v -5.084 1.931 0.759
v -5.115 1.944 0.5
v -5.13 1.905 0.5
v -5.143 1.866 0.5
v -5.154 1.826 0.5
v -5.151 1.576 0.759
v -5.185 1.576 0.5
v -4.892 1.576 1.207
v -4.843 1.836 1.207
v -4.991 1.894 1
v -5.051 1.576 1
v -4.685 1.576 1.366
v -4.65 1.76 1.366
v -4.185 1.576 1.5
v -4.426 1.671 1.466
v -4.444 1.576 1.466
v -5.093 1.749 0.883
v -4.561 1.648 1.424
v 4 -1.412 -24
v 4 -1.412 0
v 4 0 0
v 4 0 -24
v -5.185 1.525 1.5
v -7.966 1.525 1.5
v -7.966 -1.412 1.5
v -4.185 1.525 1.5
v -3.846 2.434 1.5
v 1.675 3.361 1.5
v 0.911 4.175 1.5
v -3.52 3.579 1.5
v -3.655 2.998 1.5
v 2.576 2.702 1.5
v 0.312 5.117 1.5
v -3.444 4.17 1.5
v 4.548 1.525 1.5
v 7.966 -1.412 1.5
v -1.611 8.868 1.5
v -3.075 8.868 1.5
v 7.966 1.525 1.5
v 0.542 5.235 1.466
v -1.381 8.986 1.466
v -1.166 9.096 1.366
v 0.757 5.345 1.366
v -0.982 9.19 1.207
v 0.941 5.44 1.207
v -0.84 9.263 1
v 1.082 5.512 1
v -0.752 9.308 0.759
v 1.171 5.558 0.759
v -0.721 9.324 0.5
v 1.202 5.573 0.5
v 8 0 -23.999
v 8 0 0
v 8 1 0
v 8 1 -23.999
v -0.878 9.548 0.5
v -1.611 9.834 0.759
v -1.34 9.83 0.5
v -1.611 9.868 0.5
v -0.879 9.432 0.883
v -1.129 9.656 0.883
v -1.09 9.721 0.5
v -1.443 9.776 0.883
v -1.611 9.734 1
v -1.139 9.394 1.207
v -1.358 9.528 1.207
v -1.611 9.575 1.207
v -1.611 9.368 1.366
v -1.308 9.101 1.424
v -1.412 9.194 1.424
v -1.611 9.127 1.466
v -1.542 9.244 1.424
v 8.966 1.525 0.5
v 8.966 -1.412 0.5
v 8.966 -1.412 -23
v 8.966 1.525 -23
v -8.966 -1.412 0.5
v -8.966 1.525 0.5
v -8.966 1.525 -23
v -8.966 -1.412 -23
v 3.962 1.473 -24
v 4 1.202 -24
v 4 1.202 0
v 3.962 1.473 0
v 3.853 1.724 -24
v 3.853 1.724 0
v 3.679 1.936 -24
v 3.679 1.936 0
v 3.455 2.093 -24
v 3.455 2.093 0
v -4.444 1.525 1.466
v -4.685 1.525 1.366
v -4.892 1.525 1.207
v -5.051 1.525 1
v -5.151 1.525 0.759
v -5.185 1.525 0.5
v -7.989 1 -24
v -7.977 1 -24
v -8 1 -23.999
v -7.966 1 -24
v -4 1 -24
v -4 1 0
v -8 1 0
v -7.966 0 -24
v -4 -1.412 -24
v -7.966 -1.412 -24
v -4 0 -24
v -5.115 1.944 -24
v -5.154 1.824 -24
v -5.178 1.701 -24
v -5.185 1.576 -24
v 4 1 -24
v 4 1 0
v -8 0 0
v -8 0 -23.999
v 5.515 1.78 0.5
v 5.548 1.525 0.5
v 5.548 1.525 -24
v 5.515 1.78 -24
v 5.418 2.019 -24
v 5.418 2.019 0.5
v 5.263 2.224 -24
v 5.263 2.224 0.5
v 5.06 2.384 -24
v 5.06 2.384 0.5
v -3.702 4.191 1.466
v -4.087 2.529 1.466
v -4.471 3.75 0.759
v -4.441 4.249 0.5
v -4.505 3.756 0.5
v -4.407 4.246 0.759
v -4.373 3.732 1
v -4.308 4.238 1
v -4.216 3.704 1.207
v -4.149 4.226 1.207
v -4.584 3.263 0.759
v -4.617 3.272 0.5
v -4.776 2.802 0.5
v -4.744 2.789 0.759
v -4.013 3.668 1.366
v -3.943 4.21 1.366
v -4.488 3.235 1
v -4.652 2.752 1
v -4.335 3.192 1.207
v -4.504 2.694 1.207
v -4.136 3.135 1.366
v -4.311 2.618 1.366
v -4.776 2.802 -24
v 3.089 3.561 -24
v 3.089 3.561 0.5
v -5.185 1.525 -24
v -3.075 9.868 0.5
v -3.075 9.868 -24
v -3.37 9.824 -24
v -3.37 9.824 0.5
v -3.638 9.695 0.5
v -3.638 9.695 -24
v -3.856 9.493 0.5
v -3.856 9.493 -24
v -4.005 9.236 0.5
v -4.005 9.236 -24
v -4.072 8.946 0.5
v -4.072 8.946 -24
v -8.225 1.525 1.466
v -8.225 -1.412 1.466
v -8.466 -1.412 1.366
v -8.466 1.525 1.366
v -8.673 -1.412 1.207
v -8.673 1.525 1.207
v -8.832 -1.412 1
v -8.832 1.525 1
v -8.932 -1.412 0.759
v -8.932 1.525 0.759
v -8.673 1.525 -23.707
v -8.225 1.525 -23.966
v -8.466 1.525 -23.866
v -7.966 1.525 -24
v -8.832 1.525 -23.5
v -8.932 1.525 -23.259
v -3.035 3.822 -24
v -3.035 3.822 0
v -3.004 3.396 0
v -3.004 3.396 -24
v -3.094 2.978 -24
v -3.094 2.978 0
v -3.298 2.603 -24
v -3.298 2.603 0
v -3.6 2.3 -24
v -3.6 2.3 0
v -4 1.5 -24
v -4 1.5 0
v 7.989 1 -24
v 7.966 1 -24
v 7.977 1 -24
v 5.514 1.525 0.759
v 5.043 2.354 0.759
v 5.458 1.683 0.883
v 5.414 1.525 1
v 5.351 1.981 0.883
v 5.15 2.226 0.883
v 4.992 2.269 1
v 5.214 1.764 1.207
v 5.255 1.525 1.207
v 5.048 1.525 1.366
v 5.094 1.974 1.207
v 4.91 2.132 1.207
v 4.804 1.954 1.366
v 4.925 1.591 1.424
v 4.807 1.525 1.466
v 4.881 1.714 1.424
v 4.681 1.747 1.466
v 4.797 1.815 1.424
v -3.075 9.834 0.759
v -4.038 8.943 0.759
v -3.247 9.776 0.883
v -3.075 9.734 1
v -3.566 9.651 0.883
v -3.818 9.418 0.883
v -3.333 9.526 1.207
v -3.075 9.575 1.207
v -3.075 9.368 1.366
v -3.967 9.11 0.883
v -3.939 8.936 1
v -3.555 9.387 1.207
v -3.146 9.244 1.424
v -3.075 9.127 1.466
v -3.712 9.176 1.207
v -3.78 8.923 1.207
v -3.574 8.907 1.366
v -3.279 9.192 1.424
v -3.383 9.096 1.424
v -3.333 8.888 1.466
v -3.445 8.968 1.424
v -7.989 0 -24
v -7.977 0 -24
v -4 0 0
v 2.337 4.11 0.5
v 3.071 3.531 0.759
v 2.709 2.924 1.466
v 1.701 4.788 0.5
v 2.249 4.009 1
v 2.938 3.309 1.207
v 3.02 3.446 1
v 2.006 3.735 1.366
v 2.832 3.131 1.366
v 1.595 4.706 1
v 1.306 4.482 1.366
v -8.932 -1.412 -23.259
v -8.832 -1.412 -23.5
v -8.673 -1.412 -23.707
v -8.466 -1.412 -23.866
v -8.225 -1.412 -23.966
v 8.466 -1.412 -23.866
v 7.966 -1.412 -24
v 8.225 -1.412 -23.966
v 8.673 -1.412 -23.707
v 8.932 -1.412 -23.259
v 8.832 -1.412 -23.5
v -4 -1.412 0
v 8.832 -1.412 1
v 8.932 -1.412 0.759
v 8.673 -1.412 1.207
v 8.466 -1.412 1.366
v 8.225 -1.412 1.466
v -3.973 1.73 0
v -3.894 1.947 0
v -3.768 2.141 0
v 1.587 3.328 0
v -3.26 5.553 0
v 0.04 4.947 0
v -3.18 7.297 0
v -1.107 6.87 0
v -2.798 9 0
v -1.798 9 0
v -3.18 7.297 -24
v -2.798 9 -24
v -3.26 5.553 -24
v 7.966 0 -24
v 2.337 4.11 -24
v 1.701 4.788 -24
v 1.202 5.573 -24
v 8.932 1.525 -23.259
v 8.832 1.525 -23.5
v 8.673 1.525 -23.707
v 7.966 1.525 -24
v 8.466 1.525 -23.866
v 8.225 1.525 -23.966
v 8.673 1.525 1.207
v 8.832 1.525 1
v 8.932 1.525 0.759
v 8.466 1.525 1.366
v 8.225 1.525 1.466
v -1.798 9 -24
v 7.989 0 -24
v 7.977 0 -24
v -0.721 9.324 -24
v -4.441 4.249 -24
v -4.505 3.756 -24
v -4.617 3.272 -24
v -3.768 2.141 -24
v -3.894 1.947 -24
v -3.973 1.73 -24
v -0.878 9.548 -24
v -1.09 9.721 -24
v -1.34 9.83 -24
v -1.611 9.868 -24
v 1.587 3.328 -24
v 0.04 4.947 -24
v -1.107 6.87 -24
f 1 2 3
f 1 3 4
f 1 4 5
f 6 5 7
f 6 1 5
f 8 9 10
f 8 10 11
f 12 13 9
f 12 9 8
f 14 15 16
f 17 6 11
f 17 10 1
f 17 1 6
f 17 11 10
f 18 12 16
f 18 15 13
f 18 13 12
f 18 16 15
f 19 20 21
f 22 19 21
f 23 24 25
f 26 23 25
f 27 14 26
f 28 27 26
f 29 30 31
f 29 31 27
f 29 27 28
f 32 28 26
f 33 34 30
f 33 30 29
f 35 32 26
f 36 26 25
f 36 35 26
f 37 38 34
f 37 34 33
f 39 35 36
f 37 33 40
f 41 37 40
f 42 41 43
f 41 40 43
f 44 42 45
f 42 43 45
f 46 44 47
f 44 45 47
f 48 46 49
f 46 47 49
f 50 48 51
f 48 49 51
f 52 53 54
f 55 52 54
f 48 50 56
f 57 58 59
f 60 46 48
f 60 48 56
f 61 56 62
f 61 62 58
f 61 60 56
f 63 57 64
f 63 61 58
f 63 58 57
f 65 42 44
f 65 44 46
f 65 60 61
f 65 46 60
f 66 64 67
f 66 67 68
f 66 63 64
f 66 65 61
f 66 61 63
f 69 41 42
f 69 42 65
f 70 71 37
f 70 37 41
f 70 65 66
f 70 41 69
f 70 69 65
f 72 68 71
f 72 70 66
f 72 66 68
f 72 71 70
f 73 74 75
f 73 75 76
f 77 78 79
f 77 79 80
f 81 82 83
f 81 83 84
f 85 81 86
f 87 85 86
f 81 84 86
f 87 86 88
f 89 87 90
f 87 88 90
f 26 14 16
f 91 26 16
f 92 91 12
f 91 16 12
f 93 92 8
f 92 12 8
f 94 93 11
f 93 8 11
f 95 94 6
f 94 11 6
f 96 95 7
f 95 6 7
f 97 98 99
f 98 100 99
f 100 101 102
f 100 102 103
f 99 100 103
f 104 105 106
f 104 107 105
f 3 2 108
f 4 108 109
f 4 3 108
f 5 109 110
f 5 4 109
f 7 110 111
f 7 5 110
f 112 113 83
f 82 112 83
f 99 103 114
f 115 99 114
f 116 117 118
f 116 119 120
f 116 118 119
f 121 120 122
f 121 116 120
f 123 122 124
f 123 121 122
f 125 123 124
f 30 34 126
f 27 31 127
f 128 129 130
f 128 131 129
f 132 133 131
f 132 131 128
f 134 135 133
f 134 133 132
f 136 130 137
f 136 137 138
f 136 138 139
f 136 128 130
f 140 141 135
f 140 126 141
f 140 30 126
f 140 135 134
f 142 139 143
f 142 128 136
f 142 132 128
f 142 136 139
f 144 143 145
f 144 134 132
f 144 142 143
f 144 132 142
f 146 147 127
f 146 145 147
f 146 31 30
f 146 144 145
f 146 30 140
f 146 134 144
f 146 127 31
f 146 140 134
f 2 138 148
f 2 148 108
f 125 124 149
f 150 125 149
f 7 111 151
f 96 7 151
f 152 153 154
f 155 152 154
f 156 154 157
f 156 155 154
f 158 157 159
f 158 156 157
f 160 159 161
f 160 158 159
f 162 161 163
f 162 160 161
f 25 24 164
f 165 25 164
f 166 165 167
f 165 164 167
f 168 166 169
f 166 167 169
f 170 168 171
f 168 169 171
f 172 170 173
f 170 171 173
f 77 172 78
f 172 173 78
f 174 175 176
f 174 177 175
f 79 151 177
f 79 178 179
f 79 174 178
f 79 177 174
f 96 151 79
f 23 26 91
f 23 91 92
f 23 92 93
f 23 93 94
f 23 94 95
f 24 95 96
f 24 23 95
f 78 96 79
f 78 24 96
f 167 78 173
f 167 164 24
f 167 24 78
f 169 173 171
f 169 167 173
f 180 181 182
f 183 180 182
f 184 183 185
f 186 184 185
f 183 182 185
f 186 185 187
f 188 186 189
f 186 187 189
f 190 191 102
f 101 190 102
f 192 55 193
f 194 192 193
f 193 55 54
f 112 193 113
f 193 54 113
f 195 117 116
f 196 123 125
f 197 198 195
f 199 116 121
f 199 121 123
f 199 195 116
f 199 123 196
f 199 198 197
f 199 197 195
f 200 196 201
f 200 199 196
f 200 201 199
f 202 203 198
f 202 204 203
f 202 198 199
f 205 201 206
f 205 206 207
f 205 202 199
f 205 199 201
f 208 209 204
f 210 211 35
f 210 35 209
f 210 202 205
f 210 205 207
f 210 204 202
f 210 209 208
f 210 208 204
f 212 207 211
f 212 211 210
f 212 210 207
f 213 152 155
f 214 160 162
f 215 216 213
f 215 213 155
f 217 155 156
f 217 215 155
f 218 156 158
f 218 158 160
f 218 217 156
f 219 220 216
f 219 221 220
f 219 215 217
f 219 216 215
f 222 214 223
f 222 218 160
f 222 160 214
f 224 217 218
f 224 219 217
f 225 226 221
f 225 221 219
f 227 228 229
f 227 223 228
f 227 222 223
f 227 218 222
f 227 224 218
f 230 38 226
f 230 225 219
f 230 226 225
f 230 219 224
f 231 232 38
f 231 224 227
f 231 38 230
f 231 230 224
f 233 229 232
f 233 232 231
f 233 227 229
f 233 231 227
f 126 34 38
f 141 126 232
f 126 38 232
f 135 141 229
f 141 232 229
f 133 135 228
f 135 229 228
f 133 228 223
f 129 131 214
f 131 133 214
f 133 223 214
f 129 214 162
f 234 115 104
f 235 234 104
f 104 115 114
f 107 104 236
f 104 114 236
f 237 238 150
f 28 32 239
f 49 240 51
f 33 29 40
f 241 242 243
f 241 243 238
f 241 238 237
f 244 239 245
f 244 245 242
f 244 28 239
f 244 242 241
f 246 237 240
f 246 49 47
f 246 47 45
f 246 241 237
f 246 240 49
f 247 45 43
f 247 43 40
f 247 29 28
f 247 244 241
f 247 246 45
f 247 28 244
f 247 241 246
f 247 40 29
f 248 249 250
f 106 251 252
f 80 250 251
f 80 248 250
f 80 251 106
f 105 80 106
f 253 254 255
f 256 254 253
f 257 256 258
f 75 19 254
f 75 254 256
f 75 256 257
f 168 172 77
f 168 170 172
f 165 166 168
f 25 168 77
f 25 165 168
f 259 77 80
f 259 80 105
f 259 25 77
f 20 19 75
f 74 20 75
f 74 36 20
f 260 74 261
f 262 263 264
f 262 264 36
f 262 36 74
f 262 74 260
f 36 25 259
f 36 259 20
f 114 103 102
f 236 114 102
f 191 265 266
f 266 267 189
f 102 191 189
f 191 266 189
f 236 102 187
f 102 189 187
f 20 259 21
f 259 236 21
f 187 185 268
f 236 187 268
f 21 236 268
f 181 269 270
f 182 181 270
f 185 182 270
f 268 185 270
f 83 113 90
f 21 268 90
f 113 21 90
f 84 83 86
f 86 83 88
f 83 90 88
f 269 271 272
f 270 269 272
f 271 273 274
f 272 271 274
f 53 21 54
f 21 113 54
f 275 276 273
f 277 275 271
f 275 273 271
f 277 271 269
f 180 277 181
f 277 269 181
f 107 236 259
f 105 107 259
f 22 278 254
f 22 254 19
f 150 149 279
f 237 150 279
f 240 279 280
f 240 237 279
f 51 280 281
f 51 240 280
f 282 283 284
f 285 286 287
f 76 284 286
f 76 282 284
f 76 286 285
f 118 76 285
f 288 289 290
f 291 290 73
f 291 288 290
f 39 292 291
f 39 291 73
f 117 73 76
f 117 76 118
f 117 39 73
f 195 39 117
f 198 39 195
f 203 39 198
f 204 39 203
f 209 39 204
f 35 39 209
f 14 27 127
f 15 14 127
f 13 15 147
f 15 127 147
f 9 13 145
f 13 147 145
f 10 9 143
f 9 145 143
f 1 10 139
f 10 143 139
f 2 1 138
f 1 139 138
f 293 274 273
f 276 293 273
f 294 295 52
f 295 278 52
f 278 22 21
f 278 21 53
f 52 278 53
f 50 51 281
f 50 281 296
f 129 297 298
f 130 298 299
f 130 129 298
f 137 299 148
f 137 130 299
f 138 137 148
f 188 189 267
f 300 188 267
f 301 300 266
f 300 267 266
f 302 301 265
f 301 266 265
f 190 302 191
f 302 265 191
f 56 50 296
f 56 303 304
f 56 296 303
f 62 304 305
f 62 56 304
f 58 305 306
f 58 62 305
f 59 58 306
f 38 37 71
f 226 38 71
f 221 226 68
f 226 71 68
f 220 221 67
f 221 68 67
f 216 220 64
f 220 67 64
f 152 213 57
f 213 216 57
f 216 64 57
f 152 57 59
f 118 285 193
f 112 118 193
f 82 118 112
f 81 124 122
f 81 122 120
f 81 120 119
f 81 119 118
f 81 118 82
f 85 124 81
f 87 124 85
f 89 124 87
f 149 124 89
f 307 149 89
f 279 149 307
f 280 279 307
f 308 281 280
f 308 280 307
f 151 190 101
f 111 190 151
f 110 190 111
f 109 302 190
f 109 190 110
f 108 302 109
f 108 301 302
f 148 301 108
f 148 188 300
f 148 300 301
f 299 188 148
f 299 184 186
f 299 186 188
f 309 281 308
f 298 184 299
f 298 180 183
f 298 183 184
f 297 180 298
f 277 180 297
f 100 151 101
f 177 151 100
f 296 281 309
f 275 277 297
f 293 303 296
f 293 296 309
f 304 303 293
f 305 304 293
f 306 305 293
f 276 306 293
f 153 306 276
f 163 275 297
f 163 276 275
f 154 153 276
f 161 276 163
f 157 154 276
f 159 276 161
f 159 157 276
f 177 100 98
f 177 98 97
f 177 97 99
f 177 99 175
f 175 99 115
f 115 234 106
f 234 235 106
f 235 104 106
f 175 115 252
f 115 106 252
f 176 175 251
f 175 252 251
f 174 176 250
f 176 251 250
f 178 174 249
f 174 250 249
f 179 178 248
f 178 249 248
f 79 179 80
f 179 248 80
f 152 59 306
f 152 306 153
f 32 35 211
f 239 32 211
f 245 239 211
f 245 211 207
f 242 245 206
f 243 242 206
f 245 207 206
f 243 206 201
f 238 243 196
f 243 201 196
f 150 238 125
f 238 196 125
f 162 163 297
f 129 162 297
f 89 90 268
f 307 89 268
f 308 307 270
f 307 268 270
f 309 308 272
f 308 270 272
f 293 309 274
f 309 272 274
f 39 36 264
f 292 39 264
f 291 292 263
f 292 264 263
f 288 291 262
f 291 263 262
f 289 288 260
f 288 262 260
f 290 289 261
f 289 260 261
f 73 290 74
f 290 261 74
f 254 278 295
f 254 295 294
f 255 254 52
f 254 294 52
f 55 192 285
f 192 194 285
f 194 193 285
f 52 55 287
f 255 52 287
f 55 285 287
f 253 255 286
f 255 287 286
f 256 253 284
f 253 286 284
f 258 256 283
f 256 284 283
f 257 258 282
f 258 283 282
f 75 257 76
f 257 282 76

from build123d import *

# Parameters (mm, degrees)
EXTRUSION1_DEPTH = 24
EXTRUSION2_START = 1.5
EXTRUSION2_DEPTH = 1.5
CONG_1_R         = 1


with BuildPart() as part:
    # Esquisse1 → Extrusion1 (new body)
    with BuildSketch(Plane.XY):
        with BuildLine():
            Line((-5.185390739, 1.525025478), (-5.185390739, 1.576014862))
            ThreePointArc((-5.185390739, 1.576014862), (-5.167721774, 1.763166505), (-5.115339265, 1.943704595))
            Line((-5.115339265, 1.943704595), (-4.776128633, 2.801624733))
            ThreePointArc((-4.776128633, 2.801624733), (-4.554638642, 3.512645897), (-4.441213812, 4.248678315))
            Line((-4.441213812, 4.248678315), (-4.072373491, 8.946086961))
            ThreePointArc((-4.072373491, 8.946086961), (-3.754309066, 9.602069144), (-3.075442001, 9.867807945))
            Line((-3.075442001, 9.867807945), (-1.611111903, 9.867807945))
            ThreePointArc((-1.611111903, 9.867807945), (-1.089661402, 9.721089477), (-0.721223737, 9.323986693))
            Line((-0.721223737, 9.323986693), (1.201547539, 5.573151281))
            ThreePointArc((1.201547539, 5.573151281), (2.003498303, 4.434130377), (3.08856632, 3.560562379))
            Line((3.08856632, 3.560562379), (5.060428728, 2.383722007))
            ThreePointArc((5.060428728, 2.383722007), (5.417566192, 2.018743813), (5.547944317, 1.525025478))
            Line((5.547944317, 1.525025478), (7.966203889, 1.525025478))
            Line((7.966203889, 1.525025478), (8.966203889, 1.525025478))
            Line((8.966203889, 1.525025478), (8.966203889, -1.412448643))
            Line((8.966203889, -1.412448643), (7.966203889, -1.412448643))
            Line((7.966203889, -1.412448643), (4, -1.412448643))
            Line((4, -1.412448643), (4, 0))
            Line((4, 0), (8, 0))
            Line((8, 0), (8, 1))
            Line((8, 1), (4, 1))
            Line((4, 1), (4, 1.202041029))
            ThreePointArc((4, 1.202041029), (3.852802865, 1.724273997), (3.454545455, 2.092764572))
            ThreePointArc((3.454545455, 2.092764572), (0.040046913, 4.946972092), (-1.797958971, 9))
            Line((-1.797958971, 9), (-2.797958971, 9))
            ThreePointArc((-2.797958971, 9), (-3.257790087, 6.426670848), (-3.034989317, 3.822092686))
            ThreePointArc((-3.034989317, 3.822092686), (-3.093760184, 2.977994654), (-3.6, 2.3))
            ThreePointArc((-3.6, 2.3), (-3.894427191, 1.947213595), (-4, 1.5))
            Line((-4, 1.5), (-4, 1))
            Line((-4, 1), (-8, 1))
            Line((-8, 1), (-8, 0))
            Line((-8, 0), (-4, 0))
            Line((-4, 0), (-4, -1.412448643))
            Line((-4, -1.412448643), (-7.966203889, -1.412448643))
            Line((-7.966203889, -1.412448643), (-8.966203889, -1.412448643))
            Line((-8.966203889, -1.412448643), (-8.966203889, 1.525025478))
            Line((-8.966203889, 1.525025478), (-7.966203889, 1.525025478))
            Line((-7.966203889, 1.525025478), (-5.185390739, 1.525025478))
        make_face()
    extrude(amount=-EXTRUSION1_DEPTH)

    # Esquisse2 → Extrusion2 (add)
    with BuildSketch(Plane.XY.offset(EXTRUSION2_START)):
        with BuildLine():
            Line((-4, -1.412448643), (4, -1.412448643))
            Line((4, -1.412448643), (8.966203889, -1.412448643))
            Line((8.966203889, -1.412448643), (8.966203889, 1.525025478))
            Line((8.966203889, 1.525025478), (5.547944317, 1.525025478))
            ThreePointArc((5.547944317, 1.525025478), (5.417566192, 2.018743813), (5.060428728, 2.383722007))
            Line((5.060428728, 2.383722007), (3.08856632, 3.560562379))
            ThreePointArc((3.08856632, 3.560562379), (2.003498303, 4.434130377), (1.201547539, 5.573151281))
            Line((1.201547539, 5.573151281), (-0.721223737, 9.323986693))
            ThreePointArc((-0.721223737, 9.323986693), (-1.089661402, 9.721089477), (-1.611111903, 9.867807945))
            Line((-1.611111903, 9.867807945), (-3.075442001, 9.867807945))
            ThreePointArc((-3.075442001, 9.867807945), (-3.754309066, 9.602069144), (-4.072373491, 8.946086961))
            Line((-4.072373491, 8.946086961), (-4.441213812, 4.248678315))
            ThreePointArc((-4.441213812, 4.248678315), (-4.554638642, 3.512645897), (-4.776128633, 2.801624733))
            Line((-4.776128633, 2.801624733), (-5.115339265, 1.943704595))
            ThreePointArc((-5.115339265, 1.943704595), (-5.167721774, 1.763166505), (-5.185390739, 1.576014862))
            Line((-5.185390739, 1.576014862), (-5.185390739, 1.525025478))
            Line((-5.185390739, 1.525025478), (-8.966203889, 1.525025478))
            Line((-8.966203889, 1.525025478), (-8.966203889, -1.412448643))
            Line((-8.966203889, -1.412448643), (-4, -1.412448643))
        make_face()
    extrude(amount=-EXTRUSION2_DEPTH)

    # Congé1
    # the kernel refuses this fillet: 1 mm, written as the material it takes off along each edge
    with BuildSketch(Plane(origin=(4.547944317, 1.525025478, 1.5), x_dir=(1, 0, 0), z_dir=(0, -1, 0))) as cong_1_piece_1:
        with BuildLine():
            CenterArc((1 - CONG_1_R, -CONG_1_R), CONG_1_R, 0, 90)
            Line((1, -CONG_1_R), (1, 0))
            Line((1, 0), (1 - CONG_1_R, 0))
        make_face()
    revolve(axis=Axis((4.547944317, 1.525025478, 1.5), (0, 0, 1)), revolution_arc=59.170542775, mode=Mode.SUBTRACT)
    with BuildSketch(Plane(origin=(5.060428728, 2.383722007, 1.5), x_dir=(-0.5124844104197742, -0.8586965290931928, 0), z_dir=(-0.8586965290931928, 0.5124844104197742, 0))) as cong_1_piece_2:
        with BuildLine():
            CenterArc((CONG_1_R, -CONG_1_R), CONG_1_R, 90, 90)
            Line((0, -CONG_1_R), (0, 0))
            Line((0, 0), (CONG_1_R, 0))
        make_face()
    extrude(amount=2.29634375, mode=Mode.SUBTRACT)
    with BuildSketch(Plane(origin=(5.650988372, 7.854045025, 1.5), x_dir=(-0.512484410419771, -0.8586965290931947, 0), z_dir=(0.8586965290931947, -0.512484410419771, 0))) as cong_1_piece_3:
        with BuildLine():
            CenterArc((5 + CONG_1_R, CONG_1_R), CONG_1_R, 180, 90)
            Line((5, CONG_1_R), (5, 0))
            Line((5, 0), (5 + CONG_1_R, 0))
        make_face()
    revolve(axis=Axis((5.650988372, 7.854045025, 1.5), (0, 0, -1)), revolution_arc=32.029740096, mode=Mode.SUBTRACT)
    with BuildSketch(Plane(origin=(1.201547539, 5.573151281, 1.5), x_dir=(-0.8898881666598102, -0.45617874878038983, 0), z_dir=(-0.45617874878038983, 0.8898881666598102, 0))) as cong_1_piece_4:
        with BuildLine():
            CenterArc((CONG_1_R, -CONG_1_R), CONG_1_R, 90, 90)
            Line((0, -CONG_1_R), (0, 0))
            Line((0, 0), (CONG_1_R, 0))
        make_face()
    extrude(amount=4.214951443, mode=Mode.SUBTRACT)
    with BuildSketch(Plane(origin=(-1.611111903, 8.867807945, 1.5), x_dir=(0.8898881666598123, 0.4561787487803857, 0), z_dir=(0.4561787487803857, -0.8898881666598123, 0))) as cong_1_piece_5:
        with BuildLine():
            CenterArc((1 - CONG_1_R, -CONG_1_R), CONG_1_R, 0, 90)
            Line((1, -CONG_1_R), (1, 0))
            Line((1, 0), (1 - CONG_1_R, 0))
        make_face()
    revolve(axis=Axis((-1.611111903, 8.867807945, 1.5), (0, 0, 1)), revolution_arc=62.859197321, mode=Mode.SUBTRACT)
    with BuildSketch(Plane(origin=(-5.185390739, 1.576014862, 1.5), x_dir=(1, 0, 0), z_dir=(0, -1, 0))) as cong_1_piece_6:
        with BuildLine():
            CenterArc((CONG_1_R, -CONG_1_R), CONG_1_R, 90, 90)
            Line((0, -CONG_1_R), (0, 0))
            Line((0, 0), (CONG_1_R, 0))
        make_face()
    extrude(amount=0.050989385, mode=Mode.SUBTRACT)
    with BuildSketch(Plane(origin=(-4.185390739, 1.576014862, 1.5), x_dir=(-0.9299485255595245, 0.3676897330762265, 0), z_dir=(0.3676897330762265, 0.9299485255595245, 0))) as cong_1_piece_7:
        with BuildLine():
            CenterArc((1 - CONG_1_R, -CONG_1_R), CONG_1_R, 0, 90)
            Line((1, -CONG_1_R), (1, 0))
            Line((1, 0), (1 - CONG_1_R, 0))
        make_face()
    revolve(axis=Axis((-4.185390739, 1.576014862, 1.5), (0, 0, 1)), revolution_arc=21.573207514, mode=Mode.SUBTRACT)
    with BuildSketch(Plane(origin=(-4.776128633, 2.801624733, 1.5), x_dir=(0.9299485255595272, -0.3676897330762192, 0), z_dir=(-0.3676897330762192, -0.9299485255595272, 0))) as cong_1_piece_8:
        with BuildLine():
            CenterArc((CONG_1_R, -CONG_1_R), CONG_1_R, 90, 90)
            Line((0, -CONG_1_R), (0, 0))
            Line((0, 0), (CONG_1_R, 0))
        make_face()
    extrude(amount=0.922545834, mode=Mode.SUBTRACT)
    with BuildSketch(Plane(origin=(-9.425871261, 4.640073399, 1.5), x_dir=(0.9969314898888016, -0.07827901678032455, 0), z_dir=(0.07827901678032455, 0.9969314898888016, 0))) as cong_1_piece_9:
        with BuildLine():
            CenterArc((5 + CONG_1_R, CONG_1_R), CONG_1_R, 180, 90)
            Line((5, CONG_1_R), (5, 0))
            Line((5, 0), (5 + CONG_1_R, 0))
        make_face()
    revolve(axis=Axis((-9.425871261, 4.640073399, 1.5), (0, 0, -1)), revolution_arc=17.083557109, mode=Mode.SUBTRACT)
    with BuildSketch(Plane(origin=(-4.072373491, 8.946086961, 1.5), x_dir=(0.9969314898888012, -0.07827901678032895, 0), z_dir=(-0.07827901678032895, -0.9969314898888012, 0))) as cong_1_piece_10:
        with BuildLine():
            CenterArc((CONG_1_R, -CONG_1_R), CONG_1_R, 90, 90)
            Line((0, -CONG_1_R), (0, 0))
            Line((0, 0), (CONG_1_R, 0))
        make_face()
    extrude(amount=4.711867058, mode=Mode.SUBTRACT)
    with BuildSketch(Plane(origin=(-3.075442001, 8.867807945, 1.5), x_dir=(0, 1, 0), z_dir=(1, 0, 0))) as cong_1_piece_11:
        with BuildLine():
            CenterArc((1 - CONG_1_R, -CONG_1_R), CONG_1_R, 0, 90)
            Line((1, -CONG_1_R), (1, 0))
            Line((1, 0), (1 - CONG_1_R, 0))
        make_face()
    revolve(axis=Axis((-3.075442001, 8.867807945, 1.5), (0, 0, 1)), revolution_arc=85.510349595, mode=Mode.SUBTRACT)
    with BuildSketch(Plane(origin=(-8.966203889, -3.912448643, -24), x_dir=(1, 0, 0), z_dir=(0, 1, 0)), Plane(origin=(8.966203889, 4.025025478, -24), x_dir=(-1, 0, 0), z_dir=(0, -1, 0)), Plane(origin=(-8.966203889, 4.025025478, 1.5), x_dir=(1, 0, 0), z_dir=(0, -1, 0))) as cong_1_piece_12:
        with BuildLine():
            CenterArc((CONG_1_R, -CONG_1_R), CONG_1_R, 90, 90)
            Line((0, -CONG_1_R), (0, 0))
            Line((0, 0), (CONG_1_R, 0))
        make_face()
    extrude(amount=7.937474121, mode=Mode.SUBTRACT)
    with BuildSketch(Plane(origin=(8.966203889, -3.912448643, 1.5), x_dir=(0, 0, -1), z_dir=(0, 1, 0))) as cong_1_piece_13:
        with BuildLine():
            CenterArc((CONG_1_R, CONG_1_R), CONG_1_R, 180, 90)
            Line((0, CONG_1_R), (0, 0))
            Line((0, 0), (CONG_1_R, 0))
        make_face()
    extrude(amount=7.937474121, mode=Mode.SUBTRACT)
    with BuildSketch(Plane(origin=(-1.611111903, 9.867807945, 1.5), x_dir=(0, -1, 0), z_dir=(-1, 0, 0))) as cong_1_piece_14:
        with BuildLine():
            CenterArc((CONG_1_R, -CONG_1_R), CONG_1_R, 90, 90)
            Line((0, -CONG_1_R), (0, 0))
            Line((0, 0), (CONG_1_R, 0))
        make_face()
    extrude(amount=1.464330098, mode=Mode.SUBTRACT)


solid = part.part
